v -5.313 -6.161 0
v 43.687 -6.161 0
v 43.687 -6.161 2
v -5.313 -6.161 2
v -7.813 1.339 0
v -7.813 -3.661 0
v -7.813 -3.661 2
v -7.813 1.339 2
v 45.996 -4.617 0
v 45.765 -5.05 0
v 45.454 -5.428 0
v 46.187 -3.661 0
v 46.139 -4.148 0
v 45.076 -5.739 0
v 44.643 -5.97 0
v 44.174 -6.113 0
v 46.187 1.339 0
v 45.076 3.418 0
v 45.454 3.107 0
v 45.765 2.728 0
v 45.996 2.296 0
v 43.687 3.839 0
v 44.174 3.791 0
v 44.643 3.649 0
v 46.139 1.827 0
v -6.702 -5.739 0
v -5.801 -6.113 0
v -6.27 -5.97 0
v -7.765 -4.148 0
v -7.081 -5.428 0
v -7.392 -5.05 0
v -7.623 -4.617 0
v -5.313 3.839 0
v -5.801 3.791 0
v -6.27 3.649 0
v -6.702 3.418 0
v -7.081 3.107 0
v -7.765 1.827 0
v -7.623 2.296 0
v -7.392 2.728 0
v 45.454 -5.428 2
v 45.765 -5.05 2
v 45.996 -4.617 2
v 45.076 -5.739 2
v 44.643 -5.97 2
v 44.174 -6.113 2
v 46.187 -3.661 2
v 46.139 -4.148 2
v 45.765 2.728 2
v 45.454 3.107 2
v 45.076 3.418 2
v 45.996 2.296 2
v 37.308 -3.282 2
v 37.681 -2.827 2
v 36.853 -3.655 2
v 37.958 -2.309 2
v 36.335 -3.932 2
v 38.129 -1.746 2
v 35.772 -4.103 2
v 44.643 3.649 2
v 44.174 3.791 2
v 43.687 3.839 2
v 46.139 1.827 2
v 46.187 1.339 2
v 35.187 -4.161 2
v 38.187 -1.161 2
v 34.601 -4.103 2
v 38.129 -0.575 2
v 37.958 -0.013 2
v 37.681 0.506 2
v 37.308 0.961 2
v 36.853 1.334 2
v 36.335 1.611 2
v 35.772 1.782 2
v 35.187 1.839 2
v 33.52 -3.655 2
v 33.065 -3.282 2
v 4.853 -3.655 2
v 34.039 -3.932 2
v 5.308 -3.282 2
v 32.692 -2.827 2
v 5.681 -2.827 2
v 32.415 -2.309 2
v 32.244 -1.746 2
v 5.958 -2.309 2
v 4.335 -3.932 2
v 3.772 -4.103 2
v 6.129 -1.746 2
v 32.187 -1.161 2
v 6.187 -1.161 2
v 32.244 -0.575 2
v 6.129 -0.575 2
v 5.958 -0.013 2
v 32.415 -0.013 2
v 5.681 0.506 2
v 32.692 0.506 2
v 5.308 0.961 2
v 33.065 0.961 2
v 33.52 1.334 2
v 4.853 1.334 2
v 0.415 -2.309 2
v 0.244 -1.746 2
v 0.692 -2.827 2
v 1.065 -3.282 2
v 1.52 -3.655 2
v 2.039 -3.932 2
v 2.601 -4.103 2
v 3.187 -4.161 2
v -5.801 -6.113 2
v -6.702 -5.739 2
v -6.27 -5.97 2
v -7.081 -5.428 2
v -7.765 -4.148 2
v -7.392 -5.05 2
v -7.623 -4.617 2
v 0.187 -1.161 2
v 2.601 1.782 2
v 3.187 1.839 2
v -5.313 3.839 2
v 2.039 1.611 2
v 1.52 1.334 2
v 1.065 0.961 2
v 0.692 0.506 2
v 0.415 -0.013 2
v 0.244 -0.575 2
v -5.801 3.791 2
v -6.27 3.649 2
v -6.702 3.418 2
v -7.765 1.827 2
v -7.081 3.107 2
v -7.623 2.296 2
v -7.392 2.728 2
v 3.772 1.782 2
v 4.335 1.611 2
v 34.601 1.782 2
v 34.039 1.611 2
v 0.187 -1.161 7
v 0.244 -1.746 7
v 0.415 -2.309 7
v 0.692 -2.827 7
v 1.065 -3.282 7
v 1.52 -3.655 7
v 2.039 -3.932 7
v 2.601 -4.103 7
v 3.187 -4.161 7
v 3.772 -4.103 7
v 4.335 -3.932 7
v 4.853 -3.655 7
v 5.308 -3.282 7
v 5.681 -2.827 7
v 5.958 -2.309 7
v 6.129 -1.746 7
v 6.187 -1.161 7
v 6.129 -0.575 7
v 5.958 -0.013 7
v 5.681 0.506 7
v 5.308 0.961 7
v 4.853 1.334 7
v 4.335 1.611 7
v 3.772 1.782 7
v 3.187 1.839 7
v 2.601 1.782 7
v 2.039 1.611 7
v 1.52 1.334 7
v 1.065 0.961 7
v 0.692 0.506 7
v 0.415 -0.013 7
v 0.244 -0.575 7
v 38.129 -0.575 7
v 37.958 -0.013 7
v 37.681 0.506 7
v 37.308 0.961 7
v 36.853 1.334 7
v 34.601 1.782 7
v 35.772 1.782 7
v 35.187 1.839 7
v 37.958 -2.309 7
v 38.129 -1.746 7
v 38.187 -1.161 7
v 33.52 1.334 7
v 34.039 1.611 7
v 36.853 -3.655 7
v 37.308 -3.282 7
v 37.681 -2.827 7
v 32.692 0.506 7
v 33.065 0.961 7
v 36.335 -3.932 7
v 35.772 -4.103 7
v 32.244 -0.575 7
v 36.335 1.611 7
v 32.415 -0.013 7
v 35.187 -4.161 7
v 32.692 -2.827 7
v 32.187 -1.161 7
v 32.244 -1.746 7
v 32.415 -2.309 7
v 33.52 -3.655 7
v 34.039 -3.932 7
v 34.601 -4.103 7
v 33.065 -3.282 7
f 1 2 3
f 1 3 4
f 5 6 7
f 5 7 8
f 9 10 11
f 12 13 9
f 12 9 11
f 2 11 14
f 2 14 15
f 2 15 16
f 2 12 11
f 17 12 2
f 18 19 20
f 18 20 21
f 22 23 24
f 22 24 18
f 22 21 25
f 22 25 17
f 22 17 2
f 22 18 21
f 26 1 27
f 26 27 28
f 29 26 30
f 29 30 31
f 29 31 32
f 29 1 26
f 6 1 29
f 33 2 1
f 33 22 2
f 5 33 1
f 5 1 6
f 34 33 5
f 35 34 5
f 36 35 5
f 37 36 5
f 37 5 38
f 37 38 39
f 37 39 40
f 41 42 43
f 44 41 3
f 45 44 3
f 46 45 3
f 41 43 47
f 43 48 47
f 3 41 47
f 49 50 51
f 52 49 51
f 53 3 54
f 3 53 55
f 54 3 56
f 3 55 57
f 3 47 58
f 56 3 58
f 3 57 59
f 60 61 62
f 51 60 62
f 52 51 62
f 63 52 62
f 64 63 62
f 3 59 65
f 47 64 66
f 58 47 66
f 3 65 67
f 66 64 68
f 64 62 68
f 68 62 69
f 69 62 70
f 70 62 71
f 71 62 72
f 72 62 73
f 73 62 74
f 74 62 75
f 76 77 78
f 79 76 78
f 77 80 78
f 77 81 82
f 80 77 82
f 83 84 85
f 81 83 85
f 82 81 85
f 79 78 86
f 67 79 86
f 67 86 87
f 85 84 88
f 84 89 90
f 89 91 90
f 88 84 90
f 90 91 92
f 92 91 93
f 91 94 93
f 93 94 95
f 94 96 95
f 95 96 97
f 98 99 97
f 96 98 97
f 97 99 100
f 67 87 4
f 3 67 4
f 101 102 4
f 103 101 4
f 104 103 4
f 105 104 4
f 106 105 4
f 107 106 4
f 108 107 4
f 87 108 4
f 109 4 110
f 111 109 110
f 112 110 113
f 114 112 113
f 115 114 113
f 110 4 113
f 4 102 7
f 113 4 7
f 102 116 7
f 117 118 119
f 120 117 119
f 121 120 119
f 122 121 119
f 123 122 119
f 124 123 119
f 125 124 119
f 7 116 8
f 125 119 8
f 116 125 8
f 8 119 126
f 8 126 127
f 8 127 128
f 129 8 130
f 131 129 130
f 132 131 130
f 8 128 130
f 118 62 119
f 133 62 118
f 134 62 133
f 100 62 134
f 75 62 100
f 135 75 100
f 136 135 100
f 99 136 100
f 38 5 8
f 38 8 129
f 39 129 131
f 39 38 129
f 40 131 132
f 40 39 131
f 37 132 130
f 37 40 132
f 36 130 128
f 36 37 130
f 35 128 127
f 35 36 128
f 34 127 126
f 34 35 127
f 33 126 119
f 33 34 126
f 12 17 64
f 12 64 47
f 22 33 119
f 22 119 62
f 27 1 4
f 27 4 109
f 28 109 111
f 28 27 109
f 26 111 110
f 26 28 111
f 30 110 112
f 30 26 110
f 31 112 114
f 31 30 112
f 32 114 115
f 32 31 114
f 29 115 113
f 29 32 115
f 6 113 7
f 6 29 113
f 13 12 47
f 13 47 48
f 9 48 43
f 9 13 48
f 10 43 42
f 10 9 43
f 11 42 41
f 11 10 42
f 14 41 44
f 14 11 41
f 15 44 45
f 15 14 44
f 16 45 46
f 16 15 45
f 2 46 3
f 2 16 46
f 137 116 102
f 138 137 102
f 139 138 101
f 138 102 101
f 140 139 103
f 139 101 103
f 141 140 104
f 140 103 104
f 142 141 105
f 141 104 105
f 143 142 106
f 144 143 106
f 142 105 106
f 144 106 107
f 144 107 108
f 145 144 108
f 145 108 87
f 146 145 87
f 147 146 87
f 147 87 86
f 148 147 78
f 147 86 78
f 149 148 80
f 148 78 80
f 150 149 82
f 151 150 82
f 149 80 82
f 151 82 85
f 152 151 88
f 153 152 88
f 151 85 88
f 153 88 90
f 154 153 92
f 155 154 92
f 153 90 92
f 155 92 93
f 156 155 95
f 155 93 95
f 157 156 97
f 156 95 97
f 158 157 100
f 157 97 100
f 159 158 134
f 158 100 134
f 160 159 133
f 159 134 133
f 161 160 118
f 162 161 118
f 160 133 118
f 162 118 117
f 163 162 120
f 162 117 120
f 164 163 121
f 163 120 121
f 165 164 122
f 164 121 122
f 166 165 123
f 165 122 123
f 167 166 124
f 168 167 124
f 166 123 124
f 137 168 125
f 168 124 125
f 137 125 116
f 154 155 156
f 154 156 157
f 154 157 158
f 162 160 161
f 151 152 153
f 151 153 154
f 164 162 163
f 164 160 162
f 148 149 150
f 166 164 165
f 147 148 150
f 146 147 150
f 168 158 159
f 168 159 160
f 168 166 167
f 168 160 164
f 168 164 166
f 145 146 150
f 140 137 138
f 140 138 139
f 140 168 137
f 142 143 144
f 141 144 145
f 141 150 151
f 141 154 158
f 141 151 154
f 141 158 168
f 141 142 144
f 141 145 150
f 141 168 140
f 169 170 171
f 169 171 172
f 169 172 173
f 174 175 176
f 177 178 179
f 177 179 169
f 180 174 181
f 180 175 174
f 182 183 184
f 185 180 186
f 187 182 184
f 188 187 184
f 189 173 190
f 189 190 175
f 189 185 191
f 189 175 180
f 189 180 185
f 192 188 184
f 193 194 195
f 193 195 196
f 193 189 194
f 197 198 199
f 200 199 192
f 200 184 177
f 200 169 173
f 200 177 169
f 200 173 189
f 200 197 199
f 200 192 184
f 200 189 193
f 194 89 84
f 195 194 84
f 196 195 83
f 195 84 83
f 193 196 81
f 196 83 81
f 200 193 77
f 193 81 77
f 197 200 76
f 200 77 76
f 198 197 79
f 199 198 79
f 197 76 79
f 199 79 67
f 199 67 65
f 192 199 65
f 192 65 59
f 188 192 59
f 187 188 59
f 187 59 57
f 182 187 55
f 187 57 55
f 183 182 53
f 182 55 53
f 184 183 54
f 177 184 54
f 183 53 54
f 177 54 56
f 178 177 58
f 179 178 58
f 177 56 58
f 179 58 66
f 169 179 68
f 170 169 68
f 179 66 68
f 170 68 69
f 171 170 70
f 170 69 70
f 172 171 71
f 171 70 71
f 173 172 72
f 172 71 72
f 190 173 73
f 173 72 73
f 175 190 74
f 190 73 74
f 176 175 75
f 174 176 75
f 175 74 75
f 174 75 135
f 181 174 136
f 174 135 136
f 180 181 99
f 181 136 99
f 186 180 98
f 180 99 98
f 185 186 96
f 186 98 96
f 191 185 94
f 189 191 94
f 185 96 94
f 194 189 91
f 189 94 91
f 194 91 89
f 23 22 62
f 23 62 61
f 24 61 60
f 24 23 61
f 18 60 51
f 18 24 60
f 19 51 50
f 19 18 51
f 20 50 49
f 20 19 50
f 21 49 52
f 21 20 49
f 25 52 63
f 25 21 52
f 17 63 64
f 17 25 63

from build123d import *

# Parameters (mm, degrees)
BOSS_EXTRUDE1_DEPTH = 2
SKETCH2_R           = 3
BOSS_EXTRUDE2_DEPTH = 5


with BuildPart() as part:
    # Sketch1 → Boss-Extrude1 (new body)
    with BuildSketch(Plane.XY):
        with BuildLine():
            Line((-5.313337951, 3.839414132), (43.686662049, 3.839414132))
            ThreePointArc((43.686662049, 3.839414132), (45.454429002, 3.107181085), (46.186662049, 1.339414132))
            Line((46.186662049, 1.339414132), (46.186662049, -3.660585868))
            ThreePointArc((46.186662049, -3.660585868), (45.454429002, -5.428352821), (43.686662049, -6.160585868))
            Line((43.686662049, -6.160585868), (-5.313337951, -6.160585868))
            ThreePointArc((-5.313337951, -6.160585868), (-7.081104904, -5.428352821), (-7.813337951, -3.660585868))
            Line((-7.813337951, -3.660585868), (-7.813337951, 1.339414132))
            ThreePointArc((-7.813337951, 1.339414132), (-7.081104904, 3.107181085), (-5.313337951, 3.839414132))
        make_face()
    extrude(amount=BOSS_EXTRUDE1_DEPTH)

    # Sketch2 → Boss-Extrude2 (add)
    with BuildSketch(Plane.XY.offset(2)):
        with Locations(Location((3.186662049, -1.160585868, 0), (0, 0, 180))):
            Circle(SKETCH2_R)
        with Locations(Location((35.186662049, -1.160585868, 0), (0, 0, 180))):
            Circle(SKETCH2_R)
    extrude(amount=BOSS_EXTRUDE2_DEPTH)


solid = part.part
